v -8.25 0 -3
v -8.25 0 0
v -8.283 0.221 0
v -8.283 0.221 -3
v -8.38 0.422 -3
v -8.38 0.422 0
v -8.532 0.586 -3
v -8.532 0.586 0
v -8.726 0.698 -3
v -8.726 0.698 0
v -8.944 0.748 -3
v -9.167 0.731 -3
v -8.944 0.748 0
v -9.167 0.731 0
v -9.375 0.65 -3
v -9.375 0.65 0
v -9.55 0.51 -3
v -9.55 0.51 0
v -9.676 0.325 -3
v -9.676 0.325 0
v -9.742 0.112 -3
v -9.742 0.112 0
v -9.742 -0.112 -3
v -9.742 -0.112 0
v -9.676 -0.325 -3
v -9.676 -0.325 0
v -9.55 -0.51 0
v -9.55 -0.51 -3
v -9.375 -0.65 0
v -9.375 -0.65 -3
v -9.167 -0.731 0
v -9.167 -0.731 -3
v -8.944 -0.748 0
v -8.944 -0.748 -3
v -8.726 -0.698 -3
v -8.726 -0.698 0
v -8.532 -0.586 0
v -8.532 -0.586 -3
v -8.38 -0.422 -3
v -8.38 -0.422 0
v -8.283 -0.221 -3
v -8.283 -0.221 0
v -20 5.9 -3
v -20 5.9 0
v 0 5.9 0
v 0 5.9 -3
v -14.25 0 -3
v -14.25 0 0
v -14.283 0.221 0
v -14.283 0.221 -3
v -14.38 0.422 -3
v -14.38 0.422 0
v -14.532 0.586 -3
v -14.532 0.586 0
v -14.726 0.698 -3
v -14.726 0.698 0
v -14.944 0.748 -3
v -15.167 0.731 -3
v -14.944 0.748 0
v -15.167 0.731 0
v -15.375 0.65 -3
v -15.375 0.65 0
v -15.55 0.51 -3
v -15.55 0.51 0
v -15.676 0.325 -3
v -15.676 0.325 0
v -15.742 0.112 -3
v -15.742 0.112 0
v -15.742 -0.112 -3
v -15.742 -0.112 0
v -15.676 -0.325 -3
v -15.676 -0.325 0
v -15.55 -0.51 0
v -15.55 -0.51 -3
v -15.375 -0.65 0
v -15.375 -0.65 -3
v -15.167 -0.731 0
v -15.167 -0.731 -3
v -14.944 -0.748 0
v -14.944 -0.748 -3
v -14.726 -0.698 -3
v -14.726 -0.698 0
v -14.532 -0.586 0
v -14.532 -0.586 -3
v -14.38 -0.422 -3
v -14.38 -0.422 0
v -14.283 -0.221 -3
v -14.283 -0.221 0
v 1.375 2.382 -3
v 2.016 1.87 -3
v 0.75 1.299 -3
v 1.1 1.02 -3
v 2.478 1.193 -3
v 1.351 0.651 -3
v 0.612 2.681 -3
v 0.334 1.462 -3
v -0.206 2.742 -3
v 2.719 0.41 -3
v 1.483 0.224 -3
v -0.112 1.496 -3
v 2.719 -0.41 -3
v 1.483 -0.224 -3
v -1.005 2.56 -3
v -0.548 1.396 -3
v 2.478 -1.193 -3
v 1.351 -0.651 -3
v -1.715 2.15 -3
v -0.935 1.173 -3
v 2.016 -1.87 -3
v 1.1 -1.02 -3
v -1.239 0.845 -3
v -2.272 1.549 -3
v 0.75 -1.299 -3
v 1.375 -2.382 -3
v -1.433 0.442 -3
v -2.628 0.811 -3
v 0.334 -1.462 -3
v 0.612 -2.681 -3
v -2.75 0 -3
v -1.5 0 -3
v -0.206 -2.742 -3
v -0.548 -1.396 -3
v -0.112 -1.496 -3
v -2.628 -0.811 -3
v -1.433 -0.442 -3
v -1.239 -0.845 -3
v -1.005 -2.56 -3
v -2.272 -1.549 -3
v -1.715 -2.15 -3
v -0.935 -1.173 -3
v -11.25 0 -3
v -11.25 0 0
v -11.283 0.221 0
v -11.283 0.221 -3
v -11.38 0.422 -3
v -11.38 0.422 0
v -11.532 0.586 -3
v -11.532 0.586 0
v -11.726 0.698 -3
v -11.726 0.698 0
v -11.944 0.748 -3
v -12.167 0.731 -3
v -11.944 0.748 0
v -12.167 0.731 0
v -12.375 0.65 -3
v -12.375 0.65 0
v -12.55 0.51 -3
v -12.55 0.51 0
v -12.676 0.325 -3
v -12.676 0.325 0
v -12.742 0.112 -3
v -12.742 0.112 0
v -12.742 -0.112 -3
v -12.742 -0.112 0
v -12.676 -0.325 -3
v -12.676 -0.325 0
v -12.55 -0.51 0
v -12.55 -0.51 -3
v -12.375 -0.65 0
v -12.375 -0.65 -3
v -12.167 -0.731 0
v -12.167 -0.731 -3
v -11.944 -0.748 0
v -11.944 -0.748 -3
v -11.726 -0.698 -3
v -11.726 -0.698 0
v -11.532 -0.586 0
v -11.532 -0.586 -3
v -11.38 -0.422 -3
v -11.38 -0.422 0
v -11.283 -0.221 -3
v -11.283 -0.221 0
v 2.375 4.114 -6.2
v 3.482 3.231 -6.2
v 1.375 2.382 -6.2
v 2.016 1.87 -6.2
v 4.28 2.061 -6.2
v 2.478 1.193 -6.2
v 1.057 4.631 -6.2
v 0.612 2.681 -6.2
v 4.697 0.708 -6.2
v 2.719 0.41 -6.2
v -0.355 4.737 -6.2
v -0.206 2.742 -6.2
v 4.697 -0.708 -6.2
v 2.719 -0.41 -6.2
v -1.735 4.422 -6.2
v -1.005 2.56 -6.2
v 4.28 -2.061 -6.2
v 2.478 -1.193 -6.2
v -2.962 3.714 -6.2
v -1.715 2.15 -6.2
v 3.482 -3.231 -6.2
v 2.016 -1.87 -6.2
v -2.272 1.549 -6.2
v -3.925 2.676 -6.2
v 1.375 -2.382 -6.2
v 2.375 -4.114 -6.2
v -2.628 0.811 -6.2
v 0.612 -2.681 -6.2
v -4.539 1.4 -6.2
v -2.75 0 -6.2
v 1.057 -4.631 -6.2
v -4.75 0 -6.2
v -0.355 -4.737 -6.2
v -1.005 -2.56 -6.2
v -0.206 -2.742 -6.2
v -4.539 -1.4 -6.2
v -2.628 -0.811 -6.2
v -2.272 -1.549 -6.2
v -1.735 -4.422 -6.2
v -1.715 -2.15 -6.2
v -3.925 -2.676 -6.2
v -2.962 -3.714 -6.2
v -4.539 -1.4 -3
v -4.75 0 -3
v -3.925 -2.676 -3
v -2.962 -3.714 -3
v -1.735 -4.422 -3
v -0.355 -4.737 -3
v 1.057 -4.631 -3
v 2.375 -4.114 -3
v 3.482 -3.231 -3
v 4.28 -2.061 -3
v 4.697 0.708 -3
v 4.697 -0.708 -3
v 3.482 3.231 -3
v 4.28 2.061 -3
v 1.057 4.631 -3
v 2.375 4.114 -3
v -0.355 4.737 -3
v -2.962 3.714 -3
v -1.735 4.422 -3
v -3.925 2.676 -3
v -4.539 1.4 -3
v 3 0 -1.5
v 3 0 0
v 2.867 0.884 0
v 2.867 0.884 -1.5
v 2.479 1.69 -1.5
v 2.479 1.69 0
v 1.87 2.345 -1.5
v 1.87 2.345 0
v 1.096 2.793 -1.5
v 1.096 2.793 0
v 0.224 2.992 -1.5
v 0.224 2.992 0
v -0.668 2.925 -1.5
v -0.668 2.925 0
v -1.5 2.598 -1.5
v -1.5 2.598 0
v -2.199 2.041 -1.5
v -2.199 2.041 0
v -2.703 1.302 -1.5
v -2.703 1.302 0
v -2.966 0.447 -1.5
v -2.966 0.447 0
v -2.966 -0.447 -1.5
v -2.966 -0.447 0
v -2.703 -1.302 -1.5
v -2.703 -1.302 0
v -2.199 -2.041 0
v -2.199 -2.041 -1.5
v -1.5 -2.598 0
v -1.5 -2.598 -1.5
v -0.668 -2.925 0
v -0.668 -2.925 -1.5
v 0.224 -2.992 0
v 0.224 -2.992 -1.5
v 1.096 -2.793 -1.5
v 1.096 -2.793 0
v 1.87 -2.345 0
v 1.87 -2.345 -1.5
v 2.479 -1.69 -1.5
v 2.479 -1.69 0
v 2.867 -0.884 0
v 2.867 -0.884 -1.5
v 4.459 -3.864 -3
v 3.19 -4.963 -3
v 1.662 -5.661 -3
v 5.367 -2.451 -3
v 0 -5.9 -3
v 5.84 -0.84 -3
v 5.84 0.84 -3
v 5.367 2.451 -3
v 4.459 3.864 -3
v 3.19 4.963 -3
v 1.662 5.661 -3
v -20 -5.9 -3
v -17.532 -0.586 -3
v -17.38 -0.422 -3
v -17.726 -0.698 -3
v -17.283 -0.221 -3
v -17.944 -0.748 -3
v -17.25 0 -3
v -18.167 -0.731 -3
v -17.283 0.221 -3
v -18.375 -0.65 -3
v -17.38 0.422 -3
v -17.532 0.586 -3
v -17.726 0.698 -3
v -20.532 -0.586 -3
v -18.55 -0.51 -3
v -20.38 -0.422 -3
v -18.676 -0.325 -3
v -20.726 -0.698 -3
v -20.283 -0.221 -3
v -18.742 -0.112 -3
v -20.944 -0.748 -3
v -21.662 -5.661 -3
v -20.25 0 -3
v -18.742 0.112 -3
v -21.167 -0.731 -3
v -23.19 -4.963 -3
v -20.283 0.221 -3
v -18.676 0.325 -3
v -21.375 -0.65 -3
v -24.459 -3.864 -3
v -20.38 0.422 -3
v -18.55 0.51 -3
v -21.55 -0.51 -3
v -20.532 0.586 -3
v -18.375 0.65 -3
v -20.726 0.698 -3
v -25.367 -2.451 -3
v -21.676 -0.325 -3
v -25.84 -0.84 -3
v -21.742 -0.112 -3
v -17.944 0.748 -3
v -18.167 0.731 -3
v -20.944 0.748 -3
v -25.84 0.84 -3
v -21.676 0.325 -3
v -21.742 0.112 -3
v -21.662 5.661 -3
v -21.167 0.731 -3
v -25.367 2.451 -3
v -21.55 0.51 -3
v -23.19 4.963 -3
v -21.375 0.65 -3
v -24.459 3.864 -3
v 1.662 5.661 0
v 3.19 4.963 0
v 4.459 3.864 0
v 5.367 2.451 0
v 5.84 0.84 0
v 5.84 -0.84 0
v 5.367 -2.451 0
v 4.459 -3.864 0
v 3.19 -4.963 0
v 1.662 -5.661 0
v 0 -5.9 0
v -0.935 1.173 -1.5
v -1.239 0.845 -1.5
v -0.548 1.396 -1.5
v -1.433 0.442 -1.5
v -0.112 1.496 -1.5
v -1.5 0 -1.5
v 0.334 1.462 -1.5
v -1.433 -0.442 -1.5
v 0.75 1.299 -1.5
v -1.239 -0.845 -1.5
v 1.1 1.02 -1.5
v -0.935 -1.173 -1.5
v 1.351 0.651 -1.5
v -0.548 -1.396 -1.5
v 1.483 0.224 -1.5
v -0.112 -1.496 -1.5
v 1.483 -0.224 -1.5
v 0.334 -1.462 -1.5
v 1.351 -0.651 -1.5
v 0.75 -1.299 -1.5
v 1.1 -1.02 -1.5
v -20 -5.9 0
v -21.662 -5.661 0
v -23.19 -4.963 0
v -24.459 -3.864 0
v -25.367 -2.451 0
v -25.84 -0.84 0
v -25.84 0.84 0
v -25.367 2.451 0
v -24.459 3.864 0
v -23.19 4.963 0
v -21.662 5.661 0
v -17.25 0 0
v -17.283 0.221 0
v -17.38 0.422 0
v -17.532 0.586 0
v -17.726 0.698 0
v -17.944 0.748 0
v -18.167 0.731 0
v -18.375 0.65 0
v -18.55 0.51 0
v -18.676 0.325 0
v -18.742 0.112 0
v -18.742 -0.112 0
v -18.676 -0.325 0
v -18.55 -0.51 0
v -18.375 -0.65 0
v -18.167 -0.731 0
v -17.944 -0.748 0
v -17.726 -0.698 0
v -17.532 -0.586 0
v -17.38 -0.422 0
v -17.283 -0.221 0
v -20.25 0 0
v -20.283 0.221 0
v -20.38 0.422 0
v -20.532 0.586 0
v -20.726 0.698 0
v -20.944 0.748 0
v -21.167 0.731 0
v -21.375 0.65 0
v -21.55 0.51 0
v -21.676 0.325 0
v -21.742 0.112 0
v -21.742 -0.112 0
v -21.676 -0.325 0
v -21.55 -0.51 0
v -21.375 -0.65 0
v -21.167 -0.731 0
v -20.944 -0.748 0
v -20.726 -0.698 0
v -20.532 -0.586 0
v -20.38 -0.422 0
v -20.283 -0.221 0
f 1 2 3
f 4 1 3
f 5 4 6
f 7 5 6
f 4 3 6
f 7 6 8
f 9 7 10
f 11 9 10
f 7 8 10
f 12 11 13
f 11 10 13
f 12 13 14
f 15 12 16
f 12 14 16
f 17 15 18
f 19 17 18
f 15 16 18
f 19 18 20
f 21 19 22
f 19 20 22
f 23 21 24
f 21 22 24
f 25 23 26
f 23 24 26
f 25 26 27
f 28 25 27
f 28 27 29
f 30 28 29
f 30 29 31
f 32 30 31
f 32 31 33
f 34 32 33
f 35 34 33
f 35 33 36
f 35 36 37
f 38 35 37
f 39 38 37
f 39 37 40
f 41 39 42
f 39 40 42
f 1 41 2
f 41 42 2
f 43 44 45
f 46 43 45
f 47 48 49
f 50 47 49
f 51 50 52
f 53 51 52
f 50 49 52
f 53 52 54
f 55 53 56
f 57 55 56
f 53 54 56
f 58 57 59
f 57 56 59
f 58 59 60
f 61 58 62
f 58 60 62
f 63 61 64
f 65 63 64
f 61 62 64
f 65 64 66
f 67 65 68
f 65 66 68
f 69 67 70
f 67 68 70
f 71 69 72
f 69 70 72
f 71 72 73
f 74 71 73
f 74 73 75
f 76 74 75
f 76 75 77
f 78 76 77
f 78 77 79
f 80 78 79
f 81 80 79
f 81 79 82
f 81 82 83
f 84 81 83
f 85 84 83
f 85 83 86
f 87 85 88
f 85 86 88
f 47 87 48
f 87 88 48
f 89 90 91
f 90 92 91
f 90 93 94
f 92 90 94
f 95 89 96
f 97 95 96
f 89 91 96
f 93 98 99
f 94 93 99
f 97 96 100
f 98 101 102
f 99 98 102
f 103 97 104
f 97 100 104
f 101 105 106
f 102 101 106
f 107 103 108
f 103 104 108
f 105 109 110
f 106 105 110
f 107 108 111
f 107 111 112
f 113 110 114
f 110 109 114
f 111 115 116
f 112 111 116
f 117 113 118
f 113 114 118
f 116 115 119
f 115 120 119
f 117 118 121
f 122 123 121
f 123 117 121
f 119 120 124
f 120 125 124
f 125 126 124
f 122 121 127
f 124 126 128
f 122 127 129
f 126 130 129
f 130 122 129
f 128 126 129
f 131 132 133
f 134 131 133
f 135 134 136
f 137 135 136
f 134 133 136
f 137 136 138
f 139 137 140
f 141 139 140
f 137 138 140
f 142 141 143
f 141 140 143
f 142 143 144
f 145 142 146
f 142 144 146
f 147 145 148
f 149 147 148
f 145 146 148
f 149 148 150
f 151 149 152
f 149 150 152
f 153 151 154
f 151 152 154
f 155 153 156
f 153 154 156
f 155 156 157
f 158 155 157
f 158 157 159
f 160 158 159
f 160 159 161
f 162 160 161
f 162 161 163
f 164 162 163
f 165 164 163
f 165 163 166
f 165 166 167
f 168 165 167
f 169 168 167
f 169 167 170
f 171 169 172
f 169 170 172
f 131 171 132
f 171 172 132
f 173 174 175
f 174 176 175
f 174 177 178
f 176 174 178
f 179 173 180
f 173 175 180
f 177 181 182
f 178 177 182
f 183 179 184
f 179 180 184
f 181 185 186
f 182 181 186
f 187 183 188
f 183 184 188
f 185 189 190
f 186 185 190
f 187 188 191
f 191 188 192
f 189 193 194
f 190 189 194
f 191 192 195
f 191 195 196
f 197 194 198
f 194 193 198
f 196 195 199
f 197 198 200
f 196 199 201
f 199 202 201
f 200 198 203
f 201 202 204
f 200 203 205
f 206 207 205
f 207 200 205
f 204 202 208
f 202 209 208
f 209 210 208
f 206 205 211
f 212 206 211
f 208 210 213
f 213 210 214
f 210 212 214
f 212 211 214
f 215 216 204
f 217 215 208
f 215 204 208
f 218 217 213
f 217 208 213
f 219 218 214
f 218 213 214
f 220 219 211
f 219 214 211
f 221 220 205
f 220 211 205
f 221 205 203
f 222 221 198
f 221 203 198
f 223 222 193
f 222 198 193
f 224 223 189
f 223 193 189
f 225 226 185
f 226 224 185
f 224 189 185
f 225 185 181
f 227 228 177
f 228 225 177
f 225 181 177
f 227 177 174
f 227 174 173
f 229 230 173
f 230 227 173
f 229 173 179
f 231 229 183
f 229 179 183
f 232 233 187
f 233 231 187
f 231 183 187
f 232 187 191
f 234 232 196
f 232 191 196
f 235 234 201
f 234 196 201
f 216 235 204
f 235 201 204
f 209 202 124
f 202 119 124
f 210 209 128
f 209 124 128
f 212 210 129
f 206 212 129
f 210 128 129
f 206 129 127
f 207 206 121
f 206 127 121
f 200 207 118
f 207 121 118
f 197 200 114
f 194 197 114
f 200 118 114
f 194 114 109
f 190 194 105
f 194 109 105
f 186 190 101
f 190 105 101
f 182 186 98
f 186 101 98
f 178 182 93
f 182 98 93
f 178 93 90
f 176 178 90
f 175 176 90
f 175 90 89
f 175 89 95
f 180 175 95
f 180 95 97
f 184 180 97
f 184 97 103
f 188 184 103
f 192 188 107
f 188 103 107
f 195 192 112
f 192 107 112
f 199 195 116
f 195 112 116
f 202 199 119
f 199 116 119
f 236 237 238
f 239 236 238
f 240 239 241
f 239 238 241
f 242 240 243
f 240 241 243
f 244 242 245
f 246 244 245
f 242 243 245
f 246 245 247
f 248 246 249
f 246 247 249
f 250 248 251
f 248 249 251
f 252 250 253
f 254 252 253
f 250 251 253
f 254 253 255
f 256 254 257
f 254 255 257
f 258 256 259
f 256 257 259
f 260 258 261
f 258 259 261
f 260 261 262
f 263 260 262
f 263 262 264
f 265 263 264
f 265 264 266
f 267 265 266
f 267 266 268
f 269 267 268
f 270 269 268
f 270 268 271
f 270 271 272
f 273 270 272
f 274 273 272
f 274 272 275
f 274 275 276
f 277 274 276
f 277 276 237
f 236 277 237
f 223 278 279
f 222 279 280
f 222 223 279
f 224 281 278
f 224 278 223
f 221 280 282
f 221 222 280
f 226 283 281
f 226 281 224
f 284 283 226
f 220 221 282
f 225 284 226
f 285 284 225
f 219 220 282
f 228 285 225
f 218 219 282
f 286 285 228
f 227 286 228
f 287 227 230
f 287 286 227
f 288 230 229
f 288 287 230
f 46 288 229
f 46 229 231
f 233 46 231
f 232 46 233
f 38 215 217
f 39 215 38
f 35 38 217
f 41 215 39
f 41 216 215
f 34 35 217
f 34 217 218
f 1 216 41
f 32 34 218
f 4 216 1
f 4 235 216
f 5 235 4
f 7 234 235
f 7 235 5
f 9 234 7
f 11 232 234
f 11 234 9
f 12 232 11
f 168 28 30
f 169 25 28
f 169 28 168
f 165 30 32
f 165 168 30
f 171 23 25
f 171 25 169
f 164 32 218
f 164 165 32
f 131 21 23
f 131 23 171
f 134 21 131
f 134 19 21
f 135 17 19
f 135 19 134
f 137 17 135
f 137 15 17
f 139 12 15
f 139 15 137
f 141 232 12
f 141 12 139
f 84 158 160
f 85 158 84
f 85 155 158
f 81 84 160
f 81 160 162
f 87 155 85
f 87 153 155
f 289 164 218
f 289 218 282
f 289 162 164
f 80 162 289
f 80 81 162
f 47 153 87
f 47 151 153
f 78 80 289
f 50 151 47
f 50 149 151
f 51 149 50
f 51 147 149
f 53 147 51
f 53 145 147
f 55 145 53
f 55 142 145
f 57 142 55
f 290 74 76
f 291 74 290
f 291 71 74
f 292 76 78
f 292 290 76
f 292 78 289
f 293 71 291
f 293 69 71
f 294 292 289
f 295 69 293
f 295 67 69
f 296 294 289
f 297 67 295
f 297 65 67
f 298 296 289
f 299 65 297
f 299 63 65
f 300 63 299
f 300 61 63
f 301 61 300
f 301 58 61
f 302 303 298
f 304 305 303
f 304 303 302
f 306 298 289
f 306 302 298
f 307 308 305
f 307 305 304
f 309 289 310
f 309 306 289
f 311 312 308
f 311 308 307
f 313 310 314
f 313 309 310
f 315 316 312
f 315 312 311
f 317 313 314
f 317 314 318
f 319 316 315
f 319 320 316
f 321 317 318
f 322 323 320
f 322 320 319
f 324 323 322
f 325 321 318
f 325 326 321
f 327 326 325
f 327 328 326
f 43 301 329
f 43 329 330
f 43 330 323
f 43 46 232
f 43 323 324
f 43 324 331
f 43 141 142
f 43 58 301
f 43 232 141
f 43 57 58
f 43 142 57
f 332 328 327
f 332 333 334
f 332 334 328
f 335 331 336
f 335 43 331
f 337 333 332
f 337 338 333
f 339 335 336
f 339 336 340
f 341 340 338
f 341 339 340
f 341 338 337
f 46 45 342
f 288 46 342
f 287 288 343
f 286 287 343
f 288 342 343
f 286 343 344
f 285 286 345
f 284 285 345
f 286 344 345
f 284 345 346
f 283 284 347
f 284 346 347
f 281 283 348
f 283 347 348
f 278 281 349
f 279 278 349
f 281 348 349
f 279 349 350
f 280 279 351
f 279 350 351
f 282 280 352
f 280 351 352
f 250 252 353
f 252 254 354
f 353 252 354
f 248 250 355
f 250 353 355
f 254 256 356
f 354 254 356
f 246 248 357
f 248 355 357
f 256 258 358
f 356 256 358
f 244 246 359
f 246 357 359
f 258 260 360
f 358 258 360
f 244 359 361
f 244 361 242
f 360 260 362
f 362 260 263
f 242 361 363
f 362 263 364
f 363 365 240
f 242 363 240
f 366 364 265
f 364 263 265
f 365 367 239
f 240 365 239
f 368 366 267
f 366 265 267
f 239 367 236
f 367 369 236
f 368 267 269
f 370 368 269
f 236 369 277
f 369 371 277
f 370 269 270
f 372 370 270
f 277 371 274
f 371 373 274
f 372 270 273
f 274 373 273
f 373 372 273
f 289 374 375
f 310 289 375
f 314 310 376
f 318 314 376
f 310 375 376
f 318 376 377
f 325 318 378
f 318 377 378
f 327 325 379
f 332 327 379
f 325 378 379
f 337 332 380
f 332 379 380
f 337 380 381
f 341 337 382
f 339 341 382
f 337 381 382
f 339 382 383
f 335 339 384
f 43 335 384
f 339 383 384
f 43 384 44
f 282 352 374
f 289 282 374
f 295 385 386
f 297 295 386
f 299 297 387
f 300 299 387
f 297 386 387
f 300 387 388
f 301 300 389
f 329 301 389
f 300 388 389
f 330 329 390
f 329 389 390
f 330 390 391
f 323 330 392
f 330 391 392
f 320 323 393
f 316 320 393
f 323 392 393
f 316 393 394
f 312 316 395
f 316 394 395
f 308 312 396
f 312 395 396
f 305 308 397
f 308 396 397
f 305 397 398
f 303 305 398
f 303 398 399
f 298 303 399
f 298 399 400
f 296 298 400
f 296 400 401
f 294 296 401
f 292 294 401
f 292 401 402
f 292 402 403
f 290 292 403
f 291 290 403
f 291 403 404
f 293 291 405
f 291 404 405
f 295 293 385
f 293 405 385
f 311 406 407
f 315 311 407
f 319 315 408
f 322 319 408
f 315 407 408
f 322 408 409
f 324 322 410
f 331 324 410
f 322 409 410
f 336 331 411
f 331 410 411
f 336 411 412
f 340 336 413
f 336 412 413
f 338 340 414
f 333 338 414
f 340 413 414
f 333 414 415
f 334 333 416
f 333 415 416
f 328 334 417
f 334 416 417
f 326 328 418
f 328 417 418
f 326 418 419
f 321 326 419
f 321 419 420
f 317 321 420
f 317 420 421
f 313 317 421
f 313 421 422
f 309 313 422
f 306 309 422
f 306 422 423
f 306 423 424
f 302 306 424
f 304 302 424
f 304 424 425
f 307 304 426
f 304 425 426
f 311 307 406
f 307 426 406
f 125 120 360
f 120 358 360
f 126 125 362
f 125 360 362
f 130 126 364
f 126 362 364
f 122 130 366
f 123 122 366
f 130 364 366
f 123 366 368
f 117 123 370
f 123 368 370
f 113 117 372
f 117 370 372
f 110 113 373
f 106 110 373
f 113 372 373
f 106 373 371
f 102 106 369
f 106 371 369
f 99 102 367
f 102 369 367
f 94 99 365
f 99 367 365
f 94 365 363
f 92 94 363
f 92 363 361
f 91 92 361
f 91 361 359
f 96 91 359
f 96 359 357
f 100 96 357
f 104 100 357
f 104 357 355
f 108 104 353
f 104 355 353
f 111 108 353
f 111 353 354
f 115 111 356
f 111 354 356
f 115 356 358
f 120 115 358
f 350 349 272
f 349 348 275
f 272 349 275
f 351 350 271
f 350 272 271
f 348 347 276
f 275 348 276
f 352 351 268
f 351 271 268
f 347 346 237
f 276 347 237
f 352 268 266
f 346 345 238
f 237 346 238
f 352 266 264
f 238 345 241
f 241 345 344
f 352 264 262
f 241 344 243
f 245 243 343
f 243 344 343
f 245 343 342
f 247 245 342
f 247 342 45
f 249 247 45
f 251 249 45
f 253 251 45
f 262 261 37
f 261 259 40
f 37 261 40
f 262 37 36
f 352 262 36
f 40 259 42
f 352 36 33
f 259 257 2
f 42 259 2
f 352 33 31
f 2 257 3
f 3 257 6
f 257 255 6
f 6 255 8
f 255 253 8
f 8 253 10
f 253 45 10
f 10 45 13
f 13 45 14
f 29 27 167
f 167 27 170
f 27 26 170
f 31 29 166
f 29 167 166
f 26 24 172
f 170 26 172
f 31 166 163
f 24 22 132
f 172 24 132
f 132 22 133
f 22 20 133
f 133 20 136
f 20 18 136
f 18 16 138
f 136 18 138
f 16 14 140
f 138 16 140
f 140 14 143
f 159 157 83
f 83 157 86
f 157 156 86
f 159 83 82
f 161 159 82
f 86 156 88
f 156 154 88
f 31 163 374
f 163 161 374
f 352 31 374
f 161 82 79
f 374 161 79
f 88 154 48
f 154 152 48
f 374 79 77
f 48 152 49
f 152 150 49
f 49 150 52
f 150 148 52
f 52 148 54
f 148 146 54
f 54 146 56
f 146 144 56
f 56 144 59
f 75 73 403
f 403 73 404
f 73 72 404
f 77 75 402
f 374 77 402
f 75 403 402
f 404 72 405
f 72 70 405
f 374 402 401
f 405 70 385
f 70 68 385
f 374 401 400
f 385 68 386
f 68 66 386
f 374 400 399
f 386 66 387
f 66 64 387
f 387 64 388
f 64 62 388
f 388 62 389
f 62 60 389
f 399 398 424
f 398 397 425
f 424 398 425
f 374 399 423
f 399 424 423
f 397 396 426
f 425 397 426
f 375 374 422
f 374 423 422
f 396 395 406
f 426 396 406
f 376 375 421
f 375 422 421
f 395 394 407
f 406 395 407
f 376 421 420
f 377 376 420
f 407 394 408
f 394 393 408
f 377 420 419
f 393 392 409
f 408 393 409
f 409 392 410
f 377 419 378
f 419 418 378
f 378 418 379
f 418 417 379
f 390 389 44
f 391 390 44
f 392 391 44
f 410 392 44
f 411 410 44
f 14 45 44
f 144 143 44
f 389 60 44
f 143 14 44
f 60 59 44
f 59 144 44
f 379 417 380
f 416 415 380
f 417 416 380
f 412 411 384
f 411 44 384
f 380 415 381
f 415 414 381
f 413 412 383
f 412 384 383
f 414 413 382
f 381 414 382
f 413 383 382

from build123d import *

# Parameters (mm, degrees)
ESQUISSE1_R        = 3
ESQUISSE1_R_2      = 0.75
BOSS_EXTRU_1_DEPTH = 3


with BuildPart() as part:
    # Esquisse1 → Boss.-Extru.1 (new body)
    with BuildSketch(Plane.XY):
        with BuildLine():
            Line((0, -5.9), (-20, -5.9))
            ThreePointArc((-20, -5.9), (-25.9, 0), (-20, 5.9))
            Line((-20, 5.9), (0, 5.9))
            ThreePointArc((0, 5.9), (5.9, 0), (0, -5.9))
        make_face()
        Circle(ESQUISSE1_R, mode=Mode.SUBTRACT)
        with Locations((-21, 0)):
            Circle(ESQUISSE1_R_2, mode=Mode.SUBTRACT)
        with Locations((-18, 0)):
            Circle(ESQUISSE1_R_2, mode=Mode.SUBTRACT)
        with Locations((-15, 0)):
            Circle(ESQUISSE1_R_2, mode=Mode.SUBTRACT)
        with Locations((-12, 0)):
            Circle(ESQUISSE1_R_2, mode=Mode.SUBTRACT)
        with Locations((-9, 0)):
            Circle(ESQUISSE1_R_2, mode=Mode.SUBTRACT)
    extrude(amount=-BOSS_EXTRU_1_DEPTH)

    # Esquisse2 → Révolution1 (revolve)
    with BuildSketch(Plane(origin=(0, 0, 0), x_dir=(1, 0, 0), z_dir=(0, 1, 0))):
        Polygon((-4.75, 6.2), (-2.75, 6.2), (-2.75, 3), (-1.5, 3), (-1.5, 1.5), (-4.75, 1.5), align=None)
    revolve(axis=Axis((0, 0, -6.2), (0, 0, 1)))


solid = part.part
